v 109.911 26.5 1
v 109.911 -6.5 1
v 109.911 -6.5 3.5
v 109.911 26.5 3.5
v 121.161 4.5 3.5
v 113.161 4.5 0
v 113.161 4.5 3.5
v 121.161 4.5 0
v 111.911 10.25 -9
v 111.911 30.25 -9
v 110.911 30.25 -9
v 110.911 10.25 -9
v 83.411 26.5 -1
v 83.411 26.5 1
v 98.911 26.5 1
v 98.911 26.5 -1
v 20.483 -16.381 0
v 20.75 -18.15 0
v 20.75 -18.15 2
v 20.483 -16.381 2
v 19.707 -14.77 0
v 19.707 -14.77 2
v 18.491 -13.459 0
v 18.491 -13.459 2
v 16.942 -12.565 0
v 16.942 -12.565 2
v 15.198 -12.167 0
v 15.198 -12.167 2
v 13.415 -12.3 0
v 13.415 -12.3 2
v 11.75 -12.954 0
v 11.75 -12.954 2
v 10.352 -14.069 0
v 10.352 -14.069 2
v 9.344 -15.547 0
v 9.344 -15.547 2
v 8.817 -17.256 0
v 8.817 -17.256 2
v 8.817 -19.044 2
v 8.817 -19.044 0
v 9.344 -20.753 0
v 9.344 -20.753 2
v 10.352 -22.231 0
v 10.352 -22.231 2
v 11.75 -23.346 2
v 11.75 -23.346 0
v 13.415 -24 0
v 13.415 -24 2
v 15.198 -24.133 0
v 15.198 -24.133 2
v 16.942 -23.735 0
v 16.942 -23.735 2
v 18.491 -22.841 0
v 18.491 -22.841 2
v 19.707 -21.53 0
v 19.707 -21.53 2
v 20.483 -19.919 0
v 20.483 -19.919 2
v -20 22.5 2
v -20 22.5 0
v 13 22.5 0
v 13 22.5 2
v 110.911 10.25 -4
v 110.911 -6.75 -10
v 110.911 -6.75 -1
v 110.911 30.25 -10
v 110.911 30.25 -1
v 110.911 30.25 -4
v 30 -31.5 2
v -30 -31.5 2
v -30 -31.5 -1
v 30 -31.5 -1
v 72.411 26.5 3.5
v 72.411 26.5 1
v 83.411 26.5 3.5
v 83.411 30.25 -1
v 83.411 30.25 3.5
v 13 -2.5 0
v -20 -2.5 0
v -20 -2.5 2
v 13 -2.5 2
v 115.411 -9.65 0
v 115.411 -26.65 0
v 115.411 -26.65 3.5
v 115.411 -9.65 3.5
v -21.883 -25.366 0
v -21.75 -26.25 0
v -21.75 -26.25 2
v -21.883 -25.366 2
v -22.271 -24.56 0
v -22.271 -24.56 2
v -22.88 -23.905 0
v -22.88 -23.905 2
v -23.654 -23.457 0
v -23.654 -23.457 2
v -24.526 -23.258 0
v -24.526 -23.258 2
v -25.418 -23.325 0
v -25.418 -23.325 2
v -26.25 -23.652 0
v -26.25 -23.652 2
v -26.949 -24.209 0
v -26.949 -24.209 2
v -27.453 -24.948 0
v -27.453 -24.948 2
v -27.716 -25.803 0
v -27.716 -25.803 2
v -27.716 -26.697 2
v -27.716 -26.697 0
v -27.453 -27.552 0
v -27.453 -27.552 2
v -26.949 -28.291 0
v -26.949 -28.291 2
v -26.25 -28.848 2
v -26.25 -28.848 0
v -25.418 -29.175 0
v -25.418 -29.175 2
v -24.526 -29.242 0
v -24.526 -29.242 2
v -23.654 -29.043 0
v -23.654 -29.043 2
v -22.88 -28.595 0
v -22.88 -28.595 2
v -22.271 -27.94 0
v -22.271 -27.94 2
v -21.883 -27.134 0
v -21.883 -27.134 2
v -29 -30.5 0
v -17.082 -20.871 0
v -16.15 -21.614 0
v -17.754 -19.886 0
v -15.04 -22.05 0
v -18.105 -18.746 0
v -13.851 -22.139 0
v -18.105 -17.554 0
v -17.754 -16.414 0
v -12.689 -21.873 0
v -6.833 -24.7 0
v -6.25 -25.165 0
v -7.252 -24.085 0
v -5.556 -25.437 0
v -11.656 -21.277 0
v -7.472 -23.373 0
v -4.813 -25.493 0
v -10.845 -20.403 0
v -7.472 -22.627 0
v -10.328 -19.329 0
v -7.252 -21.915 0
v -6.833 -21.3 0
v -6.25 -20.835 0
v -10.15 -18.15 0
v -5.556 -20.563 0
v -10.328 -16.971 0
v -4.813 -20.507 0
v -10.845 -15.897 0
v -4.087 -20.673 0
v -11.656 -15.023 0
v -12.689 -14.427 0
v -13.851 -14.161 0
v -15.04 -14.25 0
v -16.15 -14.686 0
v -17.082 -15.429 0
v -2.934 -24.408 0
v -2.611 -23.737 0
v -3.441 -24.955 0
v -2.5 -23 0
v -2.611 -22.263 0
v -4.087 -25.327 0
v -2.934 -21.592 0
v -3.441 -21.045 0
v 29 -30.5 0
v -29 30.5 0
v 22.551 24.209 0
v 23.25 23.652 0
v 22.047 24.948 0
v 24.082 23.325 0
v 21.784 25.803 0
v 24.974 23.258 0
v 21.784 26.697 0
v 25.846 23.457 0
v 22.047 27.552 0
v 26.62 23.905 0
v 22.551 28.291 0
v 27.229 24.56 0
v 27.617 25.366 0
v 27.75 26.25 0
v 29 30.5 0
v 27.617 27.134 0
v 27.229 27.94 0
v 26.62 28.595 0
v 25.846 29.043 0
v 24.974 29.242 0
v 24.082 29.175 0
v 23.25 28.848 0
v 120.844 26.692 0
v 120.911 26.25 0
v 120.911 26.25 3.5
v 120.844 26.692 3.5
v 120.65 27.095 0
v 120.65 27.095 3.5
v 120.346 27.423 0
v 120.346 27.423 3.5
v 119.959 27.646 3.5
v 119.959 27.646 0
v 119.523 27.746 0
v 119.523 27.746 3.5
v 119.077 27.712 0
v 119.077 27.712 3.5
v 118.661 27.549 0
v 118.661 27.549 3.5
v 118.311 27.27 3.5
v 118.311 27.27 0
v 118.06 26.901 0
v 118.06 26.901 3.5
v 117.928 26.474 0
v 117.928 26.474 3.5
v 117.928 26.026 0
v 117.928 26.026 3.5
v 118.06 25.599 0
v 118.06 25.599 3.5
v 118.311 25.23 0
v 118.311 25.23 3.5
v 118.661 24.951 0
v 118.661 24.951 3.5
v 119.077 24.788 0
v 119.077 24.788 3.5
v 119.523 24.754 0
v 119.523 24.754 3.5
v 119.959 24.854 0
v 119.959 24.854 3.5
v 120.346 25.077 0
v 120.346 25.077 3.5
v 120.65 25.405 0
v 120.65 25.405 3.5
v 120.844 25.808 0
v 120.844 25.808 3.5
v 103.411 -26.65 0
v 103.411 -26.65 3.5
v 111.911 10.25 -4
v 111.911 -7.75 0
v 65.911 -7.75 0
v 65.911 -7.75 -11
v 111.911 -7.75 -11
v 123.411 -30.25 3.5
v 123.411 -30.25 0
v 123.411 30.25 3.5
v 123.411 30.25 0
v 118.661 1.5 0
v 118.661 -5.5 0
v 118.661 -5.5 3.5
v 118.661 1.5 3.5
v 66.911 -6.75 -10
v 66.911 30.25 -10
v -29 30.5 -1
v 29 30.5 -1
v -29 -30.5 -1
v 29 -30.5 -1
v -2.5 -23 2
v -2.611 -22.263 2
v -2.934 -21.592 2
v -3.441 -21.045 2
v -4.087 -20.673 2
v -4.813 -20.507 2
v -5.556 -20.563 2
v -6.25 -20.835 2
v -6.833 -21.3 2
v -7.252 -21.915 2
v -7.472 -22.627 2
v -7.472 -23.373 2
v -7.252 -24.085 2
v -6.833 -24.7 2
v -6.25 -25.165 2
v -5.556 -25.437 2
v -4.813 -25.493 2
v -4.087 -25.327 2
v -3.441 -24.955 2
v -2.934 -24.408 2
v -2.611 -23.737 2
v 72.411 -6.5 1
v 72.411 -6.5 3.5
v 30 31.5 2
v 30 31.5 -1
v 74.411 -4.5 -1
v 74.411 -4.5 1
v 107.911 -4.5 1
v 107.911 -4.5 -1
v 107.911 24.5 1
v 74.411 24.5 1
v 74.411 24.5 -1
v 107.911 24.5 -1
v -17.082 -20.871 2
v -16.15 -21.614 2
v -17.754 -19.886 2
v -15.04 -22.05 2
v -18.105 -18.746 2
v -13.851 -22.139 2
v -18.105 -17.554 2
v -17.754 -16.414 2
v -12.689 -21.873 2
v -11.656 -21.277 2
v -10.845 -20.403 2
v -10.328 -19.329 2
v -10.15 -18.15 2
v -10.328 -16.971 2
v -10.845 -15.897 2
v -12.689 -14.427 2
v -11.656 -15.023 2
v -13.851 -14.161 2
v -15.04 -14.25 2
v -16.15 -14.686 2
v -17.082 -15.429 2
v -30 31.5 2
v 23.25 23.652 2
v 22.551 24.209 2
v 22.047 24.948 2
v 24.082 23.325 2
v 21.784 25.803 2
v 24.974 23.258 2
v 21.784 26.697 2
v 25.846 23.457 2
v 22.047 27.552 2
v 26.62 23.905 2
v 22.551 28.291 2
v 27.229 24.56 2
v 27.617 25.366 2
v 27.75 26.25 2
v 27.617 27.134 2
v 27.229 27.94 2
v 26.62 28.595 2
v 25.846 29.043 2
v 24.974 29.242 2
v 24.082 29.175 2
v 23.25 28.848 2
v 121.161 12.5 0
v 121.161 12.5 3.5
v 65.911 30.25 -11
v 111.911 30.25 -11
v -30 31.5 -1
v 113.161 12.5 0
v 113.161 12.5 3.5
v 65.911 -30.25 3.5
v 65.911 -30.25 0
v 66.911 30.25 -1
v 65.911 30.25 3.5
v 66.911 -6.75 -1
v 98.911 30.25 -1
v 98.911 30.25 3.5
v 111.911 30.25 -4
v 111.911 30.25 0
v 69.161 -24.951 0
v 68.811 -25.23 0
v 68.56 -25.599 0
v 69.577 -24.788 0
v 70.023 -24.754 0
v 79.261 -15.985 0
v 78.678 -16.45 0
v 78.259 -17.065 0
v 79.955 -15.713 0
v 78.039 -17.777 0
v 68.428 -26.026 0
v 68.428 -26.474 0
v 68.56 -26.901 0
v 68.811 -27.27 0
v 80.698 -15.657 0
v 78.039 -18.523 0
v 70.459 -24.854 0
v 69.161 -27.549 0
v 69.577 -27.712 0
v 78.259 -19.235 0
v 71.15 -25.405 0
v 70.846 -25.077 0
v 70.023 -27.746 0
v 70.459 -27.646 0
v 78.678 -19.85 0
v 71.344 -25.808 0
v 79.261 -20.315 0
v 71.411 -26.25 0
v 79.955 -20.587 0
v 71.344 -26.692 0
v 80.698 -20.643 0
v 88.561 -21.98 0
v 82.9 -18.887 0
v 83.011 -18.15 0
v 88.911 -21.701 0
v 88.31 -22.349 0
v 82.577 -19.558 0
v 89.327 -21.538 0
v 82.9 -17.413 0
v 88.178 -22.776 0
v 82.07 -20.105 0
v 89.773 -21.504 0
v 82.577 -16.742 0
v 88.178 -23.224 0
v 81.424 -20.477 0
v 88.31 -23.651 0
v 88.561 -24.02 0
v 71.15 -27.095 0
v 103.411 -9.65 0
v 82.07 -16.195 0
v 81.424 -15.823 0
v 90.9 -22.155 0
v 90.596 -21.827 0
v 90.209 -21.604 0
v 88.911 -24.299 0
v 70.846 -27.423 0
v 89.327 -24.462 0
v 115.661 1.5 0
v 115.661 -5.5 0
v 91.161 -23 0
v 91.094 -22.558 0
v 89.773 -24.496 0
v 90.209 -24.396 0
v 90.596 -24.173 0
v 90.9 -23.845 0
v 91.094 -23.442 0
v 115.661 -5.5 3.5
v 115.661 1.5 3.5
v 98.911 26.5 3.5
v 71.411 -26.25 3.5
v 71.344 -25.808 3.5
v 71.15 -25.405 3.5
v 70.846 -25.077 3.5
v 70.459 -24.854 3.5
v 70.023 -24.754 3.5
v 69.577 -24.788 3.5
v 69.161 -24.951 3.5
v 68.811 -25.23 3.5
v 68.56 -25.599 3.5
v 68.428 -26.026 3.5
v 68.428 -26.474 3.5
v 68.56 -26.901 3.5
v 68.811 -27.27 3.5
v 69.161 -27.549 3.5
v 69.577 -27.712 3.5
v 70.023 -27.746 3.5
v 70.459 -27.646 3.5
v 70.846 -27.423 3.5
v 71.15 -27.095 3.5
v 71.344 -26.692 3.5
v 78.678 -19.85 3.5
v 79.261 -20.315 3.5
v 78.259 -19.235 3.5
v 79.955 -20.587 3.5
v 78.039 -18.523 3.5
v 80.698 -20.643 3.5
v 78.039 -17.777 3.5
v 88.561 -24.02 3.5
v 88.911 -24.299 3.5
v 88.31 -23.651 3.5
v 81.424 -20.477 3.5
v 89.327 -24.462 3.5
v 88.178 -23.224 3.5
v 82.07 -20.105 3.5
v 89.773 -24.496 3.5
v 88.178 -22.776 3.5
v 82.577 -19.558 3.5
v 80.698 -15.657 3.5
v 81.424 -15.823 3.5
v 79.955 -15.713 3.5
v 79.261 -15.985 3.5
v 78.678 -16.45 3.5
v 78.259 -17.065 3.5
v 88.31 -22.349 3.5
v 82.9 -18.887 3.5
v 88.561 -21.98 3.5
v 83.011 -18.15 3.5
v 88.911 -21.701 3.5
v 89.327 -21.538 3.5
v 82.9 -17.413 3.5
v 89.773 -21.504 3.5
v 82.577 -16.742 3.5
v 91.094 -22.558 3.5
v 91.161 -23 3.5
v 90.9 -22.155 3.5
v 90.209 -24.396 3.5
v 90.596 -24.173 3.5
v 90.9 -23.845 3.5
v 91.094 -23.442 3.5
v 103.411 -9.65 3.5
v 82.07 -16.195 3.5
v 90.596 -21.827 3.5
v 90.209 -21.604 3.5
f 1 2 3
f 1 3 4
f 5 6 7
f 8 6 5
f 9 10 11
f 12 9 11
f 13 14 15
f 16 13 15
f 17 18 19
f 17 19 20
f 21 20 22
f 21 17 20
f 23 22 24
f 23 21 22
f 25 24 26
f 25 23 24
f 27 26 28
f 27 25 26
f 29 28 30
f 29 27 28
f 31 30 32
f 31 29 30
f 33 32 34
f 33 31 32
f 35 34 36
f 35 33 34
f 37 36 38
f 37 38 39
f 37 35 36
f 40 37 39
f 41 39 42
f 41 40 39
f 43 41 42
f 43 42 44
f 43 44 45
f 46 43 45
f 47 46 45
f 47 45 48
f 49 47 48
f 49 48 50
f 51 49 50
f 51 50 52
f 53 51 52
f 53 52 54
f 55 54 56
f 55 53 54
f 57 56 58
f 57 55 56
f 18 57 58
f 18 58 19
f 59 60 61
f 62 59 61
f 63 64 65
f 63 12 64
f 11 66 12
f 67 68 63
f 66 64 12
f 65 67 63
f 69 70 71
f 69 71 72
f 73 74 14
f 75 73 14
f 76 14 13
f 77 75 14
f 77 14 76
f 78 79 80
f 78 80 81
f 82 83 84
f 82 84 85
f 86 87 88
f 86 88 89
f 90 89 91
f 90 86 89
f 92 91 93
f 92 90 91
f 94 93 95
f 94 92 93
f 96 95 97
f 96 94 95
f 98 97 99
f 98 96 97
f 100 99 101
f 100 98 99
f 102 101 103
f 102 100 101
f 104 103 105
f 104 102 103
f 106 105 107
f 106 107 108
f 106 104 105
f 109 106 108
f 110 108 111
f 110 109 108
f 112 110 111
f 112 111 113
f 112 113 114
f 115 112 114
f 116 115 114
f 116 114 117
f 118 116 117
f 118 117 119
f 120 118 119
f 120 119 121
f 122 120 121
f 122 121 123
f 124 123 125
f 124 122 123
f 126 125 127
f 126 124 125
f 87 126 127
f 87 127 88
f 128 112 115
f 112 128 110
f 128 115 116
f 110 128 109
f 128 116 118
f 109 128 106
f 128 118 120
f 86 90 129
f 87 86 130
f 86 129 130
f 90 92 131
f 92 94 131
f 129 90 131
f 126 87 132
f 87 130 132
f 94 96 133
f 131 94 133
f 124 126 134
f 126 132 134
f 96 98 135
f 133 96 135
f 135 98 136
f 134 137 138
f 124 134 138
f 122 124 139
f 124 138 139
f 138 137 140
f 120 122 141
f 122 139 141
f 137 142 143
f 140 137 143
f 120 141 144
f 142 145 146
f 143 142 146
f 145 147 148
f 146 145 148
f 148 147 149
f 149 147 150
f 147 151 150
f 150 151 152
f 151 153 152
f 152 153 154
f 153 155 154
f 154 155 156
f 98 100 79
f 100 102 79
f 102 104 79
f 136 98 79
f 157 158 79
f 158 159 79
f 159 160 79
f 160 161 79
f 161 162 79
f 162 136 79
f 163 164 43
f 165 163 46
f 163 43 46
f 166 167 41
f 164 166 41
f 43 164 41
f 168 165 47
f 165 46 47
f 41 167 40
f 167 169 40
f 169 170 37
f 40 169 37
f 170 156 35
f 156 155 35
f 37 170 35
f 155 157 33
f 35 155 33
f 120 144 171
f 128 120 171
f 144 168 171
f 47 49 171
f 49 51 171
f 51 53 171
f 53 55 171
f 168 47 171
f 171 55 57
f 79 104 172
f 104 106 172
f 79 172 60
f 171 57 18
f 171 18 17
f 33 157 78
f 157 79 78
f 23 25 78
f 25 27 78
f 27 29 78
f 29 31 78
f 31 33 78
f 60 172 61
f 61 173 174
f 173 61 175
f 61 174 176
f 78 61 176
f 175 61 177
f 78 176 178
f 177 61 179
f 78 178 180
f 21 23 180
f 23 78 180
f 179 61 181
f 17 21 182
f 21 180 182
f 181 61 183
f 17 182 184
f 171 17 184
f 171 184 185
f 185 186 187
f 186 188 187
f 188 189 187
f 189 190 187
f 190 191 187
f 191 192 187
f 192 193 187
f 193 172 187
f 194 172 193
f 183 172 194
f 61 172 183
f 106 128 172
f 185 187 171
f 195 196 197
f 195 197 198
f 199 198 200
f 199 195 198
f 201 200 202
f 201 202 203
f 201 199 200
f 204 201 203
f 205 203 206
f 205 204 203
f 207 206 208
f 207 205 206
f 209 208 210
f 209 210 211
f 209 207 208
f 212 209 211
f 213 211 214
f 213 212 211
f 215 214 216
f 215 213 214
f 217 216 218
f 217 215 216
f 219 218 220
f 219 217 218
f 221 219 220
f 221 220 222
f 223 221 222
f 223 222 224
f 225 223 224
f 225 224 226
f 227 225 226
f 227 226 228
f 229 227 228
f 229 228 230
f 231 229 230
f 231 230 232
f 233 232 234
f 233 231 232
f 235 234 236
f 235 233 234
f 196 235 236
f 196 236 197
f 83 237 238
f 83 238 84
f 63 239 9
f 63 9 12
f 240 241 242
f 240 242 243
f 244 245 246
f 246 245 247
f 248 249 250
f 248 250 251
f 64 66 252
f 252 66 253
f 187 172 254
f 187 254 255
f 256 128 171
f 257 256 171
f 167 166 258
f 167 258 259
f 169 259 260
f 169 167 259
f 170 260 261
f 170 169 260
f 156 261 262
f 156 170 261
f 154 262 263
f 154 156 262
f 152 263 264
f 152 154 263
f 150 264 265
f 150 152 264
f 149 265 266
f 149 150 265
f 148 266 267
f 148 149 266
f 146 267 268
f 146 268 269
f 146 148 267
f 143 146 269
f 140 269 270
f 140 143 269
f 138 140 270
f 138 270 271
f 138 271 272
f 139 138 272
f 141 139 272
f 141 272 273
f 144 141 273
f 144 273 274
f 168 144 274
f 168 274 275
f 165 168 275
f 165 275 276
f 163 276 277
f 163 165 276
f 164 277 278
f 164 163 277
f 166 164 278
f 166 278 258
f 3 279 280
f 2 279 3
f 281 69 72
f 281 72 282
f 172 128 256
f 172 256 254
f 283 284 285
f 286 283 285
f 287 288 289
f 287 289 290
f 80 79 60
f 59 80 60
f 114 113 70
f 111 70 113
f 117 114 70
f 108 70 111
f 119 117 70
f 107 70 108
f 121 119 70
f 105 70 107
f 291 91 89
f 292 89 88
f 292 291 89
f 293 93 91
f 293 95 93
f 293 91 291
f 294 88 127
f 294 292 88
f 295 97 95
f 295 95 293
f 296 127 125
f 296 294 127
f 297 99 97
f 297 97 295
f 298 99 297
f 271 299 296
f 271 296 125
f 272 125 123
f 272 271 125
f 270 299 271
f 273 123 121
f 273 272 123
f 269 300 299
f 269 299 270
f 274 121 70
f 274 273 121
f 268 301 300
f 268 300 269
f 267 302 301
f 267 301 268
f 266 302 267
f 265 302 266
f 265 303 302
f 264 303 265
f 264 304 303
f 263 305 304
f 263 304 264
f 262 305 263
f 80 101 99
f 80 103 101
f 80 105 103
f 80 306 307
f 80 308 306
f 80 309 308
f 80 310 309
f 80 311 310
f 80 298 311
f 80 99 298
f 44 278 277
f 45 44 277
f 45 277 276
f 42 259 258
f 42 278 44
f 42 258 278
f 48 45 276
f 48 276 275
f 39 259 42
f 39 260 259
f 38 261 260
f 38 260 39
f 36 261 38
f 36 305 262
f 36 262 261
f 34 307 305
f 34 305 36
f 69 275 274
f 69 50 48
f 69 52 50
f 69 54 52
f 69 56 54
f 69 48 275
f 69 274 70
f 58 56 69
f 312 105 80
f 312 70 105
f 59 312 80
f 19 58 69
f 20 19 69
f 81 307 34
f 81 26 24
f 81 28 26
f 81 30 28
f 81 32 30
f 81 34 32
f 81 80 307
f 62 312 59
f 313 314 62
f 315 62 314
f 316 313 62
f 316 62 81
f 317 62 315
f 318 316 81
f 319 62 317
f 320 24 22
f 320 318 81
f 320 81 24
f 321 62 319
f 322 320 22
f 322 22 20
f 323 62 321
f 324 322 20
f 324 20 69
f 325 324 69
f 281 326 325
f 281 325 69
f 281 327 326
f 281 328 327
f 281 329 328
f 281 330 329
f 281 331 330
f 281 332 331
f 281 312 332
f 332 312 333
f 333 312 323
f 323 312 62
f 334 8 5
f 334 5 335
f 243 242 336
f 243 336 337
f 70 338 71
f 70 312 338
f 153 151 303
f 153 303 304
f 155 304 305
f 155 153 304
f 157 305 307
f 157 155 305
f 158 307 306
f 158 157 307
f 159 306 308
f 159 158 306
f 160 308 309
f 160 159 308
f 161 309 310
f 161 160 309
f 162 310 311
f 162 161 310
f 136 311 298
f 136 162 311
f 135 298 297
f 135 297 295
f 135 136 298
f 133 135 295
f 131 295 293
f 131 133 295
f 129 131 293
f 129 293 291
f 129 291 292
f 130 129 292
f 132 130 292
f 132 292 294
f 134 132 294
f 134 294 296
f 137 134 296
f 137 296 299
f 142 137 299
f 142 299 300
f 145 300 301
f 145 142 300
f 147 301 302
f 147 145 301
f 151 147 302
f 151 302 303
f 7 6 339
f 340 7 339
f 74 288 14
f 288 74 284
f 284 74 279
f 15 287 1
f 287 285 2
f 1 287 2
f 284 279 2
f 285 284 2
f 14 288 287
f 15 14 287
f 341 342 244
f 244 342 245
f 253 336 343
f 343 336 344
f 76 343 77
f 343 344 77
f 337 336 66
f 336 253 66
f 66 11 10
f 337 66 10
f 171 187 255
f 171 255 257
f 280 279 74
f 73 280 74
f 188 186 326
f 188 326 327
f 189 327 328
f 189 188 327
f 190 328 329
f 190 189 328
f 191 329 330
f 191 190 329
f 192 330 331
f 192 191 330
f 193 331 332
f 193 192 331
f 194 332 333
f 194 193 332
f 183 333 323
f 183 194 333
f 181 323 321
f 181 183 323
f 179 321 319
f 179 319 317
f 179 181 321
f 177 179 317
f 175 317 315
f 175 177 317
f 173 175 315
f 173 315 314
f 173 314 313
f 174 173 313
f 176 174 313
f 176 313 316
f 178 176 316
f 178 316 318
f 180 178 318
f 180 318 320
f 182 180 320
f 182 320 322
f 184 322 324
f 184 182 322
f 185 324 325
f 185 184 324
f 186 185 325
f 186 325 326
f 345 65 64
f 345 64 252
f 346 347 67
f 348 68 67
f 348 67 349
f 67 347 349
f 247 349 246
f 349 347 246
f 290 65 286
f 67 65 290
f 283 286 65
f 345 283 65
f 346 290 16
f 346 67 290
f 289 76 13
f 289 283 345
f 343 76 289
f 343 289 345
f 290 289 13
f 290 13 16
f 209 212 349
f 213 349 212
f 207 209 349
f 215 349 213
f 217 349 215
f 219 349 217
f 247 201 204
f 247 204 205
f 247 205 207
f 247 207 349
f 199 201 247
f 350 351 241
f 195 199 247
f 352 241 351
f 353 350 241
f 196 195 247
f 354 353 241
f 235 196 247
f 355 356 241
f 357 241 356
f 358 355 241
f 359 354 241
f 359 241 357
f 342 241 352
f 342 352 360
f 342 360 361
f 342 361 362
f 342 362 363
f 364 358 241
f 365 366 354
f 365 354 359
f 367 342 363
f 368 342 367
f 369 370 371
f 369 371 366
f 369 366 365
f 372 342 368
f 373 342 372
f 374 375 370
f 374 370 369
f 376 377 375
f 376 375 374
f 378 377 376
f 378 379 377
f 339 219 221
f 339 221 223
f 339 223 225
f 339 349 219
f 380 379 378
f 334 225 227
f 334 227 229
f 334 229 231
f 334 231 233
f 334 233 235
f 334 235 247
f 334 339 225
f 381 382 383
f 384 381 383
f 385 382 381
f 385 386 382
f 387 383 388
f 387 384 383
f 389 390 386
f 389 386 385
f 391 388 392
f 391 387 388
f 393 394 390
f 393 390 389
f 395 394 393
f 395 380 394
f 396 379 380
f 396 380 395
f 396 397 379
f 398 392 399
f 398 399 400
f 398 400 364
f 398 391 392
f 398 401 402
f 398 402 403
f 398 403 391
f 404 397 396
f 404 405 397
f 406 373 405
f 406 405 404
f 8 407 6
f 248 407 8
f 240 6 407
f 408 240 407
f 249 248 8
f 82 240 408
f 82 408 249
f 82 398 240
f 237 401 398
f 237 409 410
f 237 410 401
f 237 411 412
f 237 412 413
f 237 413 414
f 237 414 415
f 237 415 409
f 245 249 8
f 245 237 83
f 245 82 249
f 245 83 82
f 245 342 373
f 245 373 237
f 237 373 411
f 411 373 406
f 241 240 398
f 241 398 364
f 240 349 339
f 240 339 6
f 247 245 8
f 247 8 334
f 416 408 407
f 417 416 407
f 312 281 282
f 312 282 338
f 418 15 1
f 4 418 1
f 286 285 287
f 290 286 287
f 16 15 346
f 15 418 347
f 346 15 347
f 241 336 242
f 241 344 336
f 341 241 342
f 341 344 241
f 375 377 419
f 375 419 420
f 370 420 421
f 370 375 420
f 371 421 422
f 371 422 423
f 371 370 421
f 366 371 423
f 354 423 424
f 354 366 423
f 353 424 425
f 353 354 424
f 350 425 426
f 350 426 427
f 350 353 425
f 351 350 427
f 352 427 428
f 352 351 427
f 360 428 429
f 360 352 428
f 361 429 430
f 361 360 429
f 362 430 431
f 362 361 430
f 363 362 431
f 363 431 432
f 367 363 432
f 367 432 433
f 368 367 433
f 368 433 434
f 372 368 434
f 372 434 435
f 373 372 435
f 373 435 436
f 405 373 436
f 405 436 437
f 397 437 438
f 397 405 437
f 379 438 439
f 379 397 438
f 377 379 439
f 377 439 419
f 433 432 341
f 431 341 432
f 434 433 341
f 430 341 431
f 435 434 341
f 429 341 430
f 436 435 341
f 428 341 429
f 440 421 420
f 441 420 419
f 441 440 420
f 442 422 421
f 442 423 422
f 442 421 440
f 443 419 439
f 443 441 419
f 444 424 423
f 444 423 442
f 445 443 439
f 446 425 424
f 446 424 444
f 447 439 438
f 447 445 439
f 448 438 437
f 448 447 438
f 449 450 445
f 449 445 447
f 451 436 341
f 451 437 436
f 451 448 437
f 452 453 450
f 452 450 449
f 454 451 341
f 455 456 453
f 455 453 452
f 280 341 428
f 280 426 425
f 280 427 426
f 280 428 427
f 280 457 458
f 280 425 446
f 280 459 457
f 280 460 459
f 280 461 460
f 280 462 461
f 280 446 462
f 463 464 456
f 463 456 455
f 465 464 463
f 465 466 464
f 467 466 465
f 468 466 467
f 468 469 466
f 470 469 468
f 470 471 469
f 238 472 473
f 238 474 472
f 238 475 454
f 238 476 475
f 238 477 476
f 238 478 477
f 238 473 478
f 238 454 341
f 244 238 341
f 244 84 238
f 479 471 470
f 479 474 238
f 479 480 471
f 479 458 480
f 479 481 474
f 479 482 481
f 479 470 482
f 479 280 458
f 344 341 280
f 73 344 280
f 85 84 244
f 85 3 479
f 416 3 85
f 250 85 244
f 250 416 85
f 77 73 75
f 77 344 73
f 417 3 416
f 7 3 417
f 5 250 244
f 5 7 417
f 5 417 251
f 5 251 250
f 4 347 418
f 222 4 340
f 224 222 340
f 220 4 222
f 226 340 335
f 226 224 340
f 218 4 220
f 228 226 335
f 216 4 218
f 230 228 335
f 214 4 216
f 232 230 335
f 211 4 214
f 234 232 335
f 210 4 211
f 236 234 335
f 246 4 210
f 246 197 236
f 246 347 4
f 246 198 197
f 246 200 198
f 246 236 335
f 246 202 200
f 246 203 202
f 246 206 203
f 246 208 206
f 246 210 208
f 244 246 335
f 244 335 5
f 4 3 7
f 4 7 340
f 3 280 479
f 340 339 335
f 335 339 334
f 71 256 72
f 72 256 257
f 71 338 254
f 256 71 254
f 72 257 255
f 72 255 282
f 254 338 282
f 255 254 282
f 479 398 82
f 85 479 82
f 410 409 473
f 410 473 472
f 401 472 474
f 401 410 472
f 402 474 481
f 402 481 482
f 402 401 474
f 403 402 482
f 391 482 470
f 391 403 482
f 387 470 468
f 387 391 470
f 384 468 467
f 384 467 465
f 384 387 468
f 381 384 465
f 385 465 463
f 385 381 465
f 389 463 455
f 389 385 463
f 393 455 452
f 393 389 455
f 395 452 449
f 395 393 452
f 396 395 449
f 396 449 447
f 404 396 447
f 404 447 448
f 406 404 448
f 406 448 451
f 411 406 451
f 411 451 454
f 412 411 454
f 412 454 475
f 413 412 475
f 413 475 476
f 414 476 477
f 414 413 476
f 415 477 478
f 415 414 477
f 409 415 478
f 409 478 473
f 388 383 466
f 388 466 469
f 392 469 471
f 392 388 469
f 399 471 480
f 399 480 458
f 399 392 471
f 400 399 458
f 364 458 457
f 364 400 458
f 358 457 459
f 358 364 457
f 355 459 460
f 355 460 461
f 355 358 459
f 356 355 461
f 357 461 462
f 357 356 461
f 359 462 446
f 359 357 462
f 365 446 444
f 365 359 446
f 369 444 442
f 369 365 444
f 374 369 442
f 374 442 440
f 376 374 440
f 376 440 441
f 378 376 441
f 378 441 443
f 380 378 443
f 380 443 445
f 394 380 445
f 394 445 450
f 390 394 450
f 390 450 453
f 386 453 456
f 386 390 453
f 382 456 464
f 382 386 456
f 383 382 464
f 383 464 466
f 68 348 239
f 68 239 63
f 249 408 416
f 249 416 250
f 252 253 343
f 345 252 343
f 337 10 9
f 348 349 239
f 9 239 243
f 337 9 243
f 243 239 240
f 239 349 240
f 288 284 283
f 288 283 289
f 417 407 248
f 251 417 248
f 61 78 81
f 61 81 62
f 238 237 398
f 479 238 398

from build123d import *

# Parameters (mm, degrees)
F1_W      = 57.5
F1_H      = 60.5
F1_R      = 1.5
F1_R_2    = 2.5
F1_W_2    = 12
F1_H_2    = 17
F1_W_3    = 3
F1_H_3    = 7
F1_W_4    = 37.5
F1_H_4    = 33
F1_W_5    = 8
F1_H_5    = 8
F2_DEPTH  = 3.5
F4_W      = 37.5
F4_H      = 33
F4_W_2    = 33.5
F4_H_2    = 29
F5_DEPTH  = 1
F3_W      = 15.5
F3_H      = 3.75
F6_DEPTH  = 2.5
F0_W      = 58
F0_H      = 61
F0_R      = 3
F0_R_2    = 4
F0_R_3    = 2.5
F0_R_4    = 6
F0_W_2    = 33
F0_H_2    = 25
F0_H_3    = 1
F8_DEPTH  = 2
F9_DEPTH  = 1
F11_W     = 46
F11_H     = 38
F12_DEPTH = 11
F13_W     = 44
F13_H     = 9
F14_DEPTH = 37
F15_W     = 1
F15_H     = 5
F16_DEPTH = 20
F17_W     = 33.5
F17_H     = 29
F17_W_2   = 15.5
F17_H_2   = 3.75
F18_DEPTH = 4


with BuildPart() as f2:
    # F1 (on Top) → F2 (new body)
    with BuildSketch(Plane.XY):
        with Locations((94.661044, 0)):
            Rectangle(F1_W, F1_H)
        with Locations((69.911044, -26.25)):
            Circle(F1_R, mode=Mode.SUBTRACT)
        with Locations((89.661044, -23)):
            Circle(F1_R, mode=Mode.SUBTRACT)
        with Locations((80.511044, -18.15)):
            Circle(F1_R_2, mode=Mode.SUBTRACT)
        with Locations((109.411044, -18.15)):
            Rectangle(F1_W_2, F1_H_2, mode=Mode.SUBTRACT)
        with Locations((117.161044, -2)):
            Rectangle(F1_W_3, F1_H_3, mode=Mode.SUBTRACT)
        with Locations((91.161044, 10)):
            Rectangle(F1_W_4, F1_H_4, mode=Mode.SUBTRACT)
        with Locations((117.161044, 8.5)):
            Rectangle(F1_W_5, F1_H_5, mode=Mode.SUBTRACT)
        with Locations((119.411044, 26.25)):
            Circle(F1_R, mode=Mode.SUBTRACT)
    extrude(amount=F2_DEPTH)

    # F4 (on face) → F5 (join)
    with BuildSketch(Plane(origin=(0, 0, 0), x_dir=(1, 0, 0), z_dir=(0, 0, -1))):
        with Locations((91.161044, -10)):
            Rectangle(F4_W, F4_H)
        with Locations((91.161044, -10)):
            Rectangle(F4_W_2, F4_H_2, mode=Mode.SUBTRACT)
    extrude(amount=-F5_DEPTH)

    # F3 (on face) → F6 (cut)
    with BuildSketch(Plane.XY.offset(3.5)):
        with Locations((91.161044, 28.375)):
            Rectangle(F3_W, F3_H)
    extrude(amount=-F6_DEPTH, mode=Mode.SUBTRACT)

    # F11 (on face) → F12 (join)
    with BuildSketch(Plane(origin=(0, 0, 0), x_dir=(1, 0, 0), z_dir=(0, 0, -1))):
        with Locations((88.911044, -11.25)):
            Rectangle(F11_W, F11_H)
    extrude(amount=F12_DEPTH)

    # F13 (on face) → F14 (cut)
    with BuildSketch(Plane(origin=(0, 30.25, 0), x_dir=(-1, 0, 0), z_dir=(0, 1, 0))):
        with Locations((-88.911044, -5.5)):
            Rectangle(F13_W, F13_H)
    extrude(amount=-F14_DEPTH, mode=Mode.SUBTRACT)

    # F15 (on face) → F16 (cut)
    with BuildSketch(Plane(origin=(0, 30.25, 0), x_dir=(-1, 0, 0), z_dir=(0, 1, 0))):
        with Locations((-111.411044, -6.5)):
            Rectangle(F15_W, F15_H)
    extrude(amount=-F16_DEPTH, mode=Mode.SUBTRACT)

    # F17 (on face) → F18 (cut)
    with BuildSketch(Plane.XY.offset(1)):
        with Locations((91.161044, 10)):
            Rectangle(F17_W, F17_H)
        with Locations((91.161044, 28.375)):
            Rectangle(F17_W_2, F17_H_2)
    extrude(amount=-F18_DEPTH, mode=Mode.SUBTRACT)


with BuildPart() as f8:
    # F0 (on Top) → F8 (new body)
    with BuildSketch(Plane.XY):
        Rectangle(F0_W, F0_H)
        with Locations((-24.75, -26.25)):
            Circle(F0_R, mode=Mode.SUBTRACT)
        with Locations((-14.15, -18.15)):
            Circle(F0_R_2, mode=Mode.SUBTRACT)
        with Locations((-5, -23)):
            Circle(F0_R_3, mode=Mode.SUBTRACT)
        with Locations((14.75, -18.15)):
            Circle(F0_R_4, mode=Mode.SUBTRACT)
        with Locations((-3.5, 10)):
            Rectangle(F0_W_2, F0_H_2, mode=Mode.SUBTRACT)
        with Locations((24.75, 26.25)):
            Circle(F0_R, mode=Mode.SUBTRACT)
        Polygon((-29, -31.5), (-29, -30.5), (-29, 30.5), (-29, 31.5), (-30, 31.5), (-30, -31.5), align=None)
        with Locations((0, 31)):
            Rectangle(F0_W, F0_H_3)
        Polygon((29, 30.5), (29, -30.5), (29, -31.5), (30, -31.5), (30, 31.5), (29, 31.5), align=None)
        with Locations((0, -31)):
            Rectangle(F0_W, F0_H_3)
    extrude(amount=F8_DEPTH)

    # F0 (on Top) → F9 (join)
    with BuildSketch(Plane.XY):
        with Locations((0, 31)):
            Rectangle(F0_W, F0_H_3)
        Polygon((-29, -31.5), (-29, -30.5), (-29, 30.5), (-29, 31.5), (-30, 31.5), (-30, -31.5), align=None)
        with Locations((0, -31)):
            Rectangle(F0_W, F0_H_3)
        Polygon((29, 30.5), (29, -30.5), (29, -31.5), (30, -31.5), (30, 31.5), (29, 31.5), align=None)
    extrude(amount=-F9_DEPTH)


solid = Compound([f2.part, f8.part])
